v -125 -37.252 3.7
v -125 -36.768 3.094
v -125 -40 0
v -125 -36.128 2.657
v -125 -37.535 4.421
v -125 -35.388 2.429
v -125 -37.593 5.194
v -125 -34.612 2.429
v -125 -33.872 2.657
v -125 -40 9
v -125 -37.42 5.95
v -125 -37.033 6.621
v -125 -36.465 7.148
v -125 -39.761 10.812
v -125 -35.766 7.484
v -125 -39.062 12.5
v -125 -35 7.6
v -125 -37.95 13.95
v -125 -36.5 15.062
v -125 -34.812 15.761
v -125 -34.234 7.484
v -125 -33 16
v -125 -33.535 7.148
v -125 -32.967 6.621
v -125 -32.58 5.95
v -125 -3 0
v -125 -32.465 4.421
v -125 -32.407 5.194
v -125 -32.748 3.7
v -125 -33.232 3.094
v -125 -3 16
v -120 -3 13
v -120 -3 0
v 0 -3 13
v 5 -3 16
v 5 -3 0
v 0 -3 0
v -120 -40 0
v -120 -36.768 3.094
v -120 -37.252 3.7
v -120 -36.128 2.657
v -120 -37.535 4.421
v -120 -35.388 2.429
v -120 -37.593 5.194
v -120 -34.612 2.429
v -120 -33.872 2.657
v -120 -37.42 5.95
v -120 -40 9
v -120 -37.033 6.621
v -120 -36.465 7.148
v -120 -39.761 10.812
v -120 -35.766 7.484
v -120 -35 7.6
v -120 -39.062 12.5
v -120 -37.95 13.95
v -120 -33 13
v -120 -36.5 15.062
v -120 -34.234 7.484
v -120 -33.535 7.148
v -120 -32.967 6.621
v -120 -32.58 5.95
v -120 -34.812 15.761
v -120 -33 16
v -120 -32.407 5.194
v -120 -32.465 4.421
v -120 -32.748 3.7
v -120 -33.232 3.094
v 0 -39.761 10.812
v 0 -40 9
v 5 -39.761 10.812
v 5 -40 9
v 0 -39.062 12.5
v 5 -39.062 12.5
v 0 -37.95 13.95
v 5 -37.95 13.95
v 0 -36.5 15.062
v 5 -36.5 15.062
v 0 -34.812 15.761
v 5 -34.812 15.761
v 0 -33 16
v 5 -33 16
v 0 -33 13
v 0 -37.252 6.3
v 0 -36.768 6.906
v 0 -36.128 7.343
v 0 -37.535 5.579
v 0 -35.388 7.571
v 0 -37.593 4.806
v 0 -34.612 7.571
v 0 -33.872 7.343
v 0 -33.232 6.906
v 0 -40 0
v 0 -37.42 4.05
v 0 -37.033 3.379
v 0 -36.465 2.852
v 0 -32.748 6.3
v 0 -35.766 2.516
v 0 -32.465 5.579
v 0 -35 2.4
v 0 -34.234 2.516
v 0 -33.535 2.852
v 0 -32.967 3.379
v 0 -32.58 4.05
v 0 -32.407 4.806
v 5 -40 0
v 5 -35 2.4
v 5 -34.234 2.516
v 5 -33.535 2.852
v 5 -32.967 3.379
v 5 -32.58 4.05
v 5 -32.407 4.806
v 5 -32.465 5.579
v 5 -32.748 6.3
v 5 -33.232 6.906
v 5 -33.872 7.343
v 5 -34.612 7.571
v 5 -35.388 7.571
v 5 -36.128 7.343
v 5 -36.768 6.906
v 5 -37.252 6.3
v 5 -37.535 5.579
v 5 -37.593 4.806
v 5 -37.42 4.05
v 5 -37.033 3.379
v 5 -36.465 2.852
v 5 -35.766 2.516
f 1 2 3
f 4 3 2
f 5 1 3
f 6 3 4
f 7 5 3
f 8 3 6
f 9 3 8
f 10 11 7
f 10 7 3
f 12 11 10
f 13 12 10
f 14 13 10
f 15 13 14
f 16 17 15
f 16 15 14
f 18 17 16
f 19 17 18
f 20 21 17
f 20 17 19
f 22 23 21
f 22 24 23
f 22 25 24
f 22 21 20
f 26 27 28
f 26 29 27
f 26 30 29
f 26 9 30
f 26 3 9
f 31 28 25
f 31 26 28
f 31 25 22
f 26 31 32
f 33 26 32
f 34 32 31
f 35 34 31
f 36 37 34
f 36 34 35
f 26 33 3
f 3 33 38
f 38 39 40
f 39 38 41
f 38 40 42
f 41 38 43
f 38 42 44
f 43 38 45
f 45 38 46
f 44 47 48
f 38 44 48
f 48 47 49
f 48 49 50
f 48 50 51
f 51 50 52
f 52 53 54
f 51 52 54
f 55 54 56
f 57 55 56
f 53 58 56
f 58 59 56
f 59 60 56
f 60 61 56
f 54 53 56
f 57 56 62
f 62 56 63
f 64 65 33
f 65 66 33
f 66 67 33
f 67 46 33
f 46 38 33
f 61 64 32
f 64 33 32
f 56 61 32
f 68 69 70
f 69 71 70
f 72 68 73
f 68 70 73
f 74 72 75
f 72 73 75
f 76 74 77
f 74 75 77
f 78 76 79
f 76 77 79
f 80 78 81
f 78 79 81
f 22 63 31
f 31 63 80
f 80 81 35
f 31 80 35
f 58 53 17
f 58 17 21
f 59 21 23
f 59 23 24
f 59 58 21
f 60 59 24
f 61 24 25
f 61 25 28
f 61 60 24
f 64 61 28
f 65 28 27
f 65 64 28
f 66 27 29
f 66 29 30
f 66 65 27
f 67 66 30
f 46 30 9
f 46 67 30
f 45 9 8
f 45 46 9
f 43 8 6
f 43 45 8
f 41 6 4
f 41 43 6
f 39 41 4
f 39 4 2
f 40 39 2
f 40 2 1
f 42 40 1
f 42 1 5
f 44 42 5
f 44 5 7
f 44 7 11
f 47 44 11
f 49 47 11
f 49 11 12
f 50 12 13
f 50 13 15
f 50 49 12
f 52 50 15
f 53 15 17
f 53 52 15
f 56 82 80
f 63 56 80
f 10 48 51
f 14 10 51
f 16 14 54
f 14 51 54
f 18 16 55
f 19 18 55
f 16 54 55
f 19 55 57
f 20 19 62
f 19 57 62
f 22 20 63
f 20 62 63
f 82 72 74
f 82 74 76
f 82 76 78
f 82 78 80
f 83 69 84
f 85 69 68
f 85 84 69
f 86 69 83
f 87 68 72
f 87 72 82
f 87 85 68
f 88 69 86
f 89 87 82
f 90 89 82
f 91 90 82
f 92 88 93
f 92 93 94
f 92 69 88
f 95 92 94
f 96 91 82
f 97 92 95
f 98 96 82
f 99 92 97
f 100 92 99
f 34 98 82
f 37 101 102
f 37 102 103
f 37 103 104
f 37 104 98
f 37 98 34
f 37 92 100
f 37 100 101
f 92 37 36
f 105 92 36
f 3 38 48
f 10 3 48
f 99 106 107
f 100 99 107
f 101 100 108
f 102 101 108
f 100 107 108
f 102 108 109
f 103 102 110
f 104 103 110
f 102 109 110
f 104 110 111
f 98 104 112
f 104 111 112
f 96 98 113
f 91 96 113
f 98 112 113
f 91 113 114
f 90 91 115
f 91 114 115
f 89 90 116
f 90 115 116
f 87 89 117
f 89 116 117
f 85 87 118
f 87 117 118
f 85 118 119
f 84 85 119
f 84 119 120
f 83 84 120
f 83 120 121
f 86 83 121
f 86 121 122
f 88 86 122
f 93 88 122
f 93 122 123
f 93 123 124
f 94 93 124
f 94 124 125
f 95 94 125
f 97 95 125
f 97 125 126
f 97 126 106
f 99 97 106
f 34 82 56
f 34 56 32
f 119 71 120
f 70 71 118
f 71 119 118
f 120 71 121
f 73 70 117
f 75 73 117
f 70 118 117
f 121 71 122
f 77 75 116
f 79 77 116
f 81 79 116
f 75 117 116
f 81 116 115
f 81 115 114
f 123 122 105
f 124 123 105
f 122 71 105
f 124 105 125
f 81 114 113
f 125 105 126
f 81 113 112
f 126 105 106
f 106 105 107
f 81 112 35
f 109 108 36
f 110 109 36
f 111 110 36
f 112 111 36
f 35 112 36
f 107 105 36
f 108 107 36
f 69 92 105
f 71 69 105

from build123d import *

# Parameters (mm, degrees)
ESQUISSE1_W             = 5
ESQUISSE1_H             = 40
BOSS_EXTRU_1_DEPTH      = 10
ESQUISSE2_R             = 2.6
ENL_V_MAT_EXTRU_1_DEPTH = 10
ESQUISSE3_W             = 5
ESQUISSE3_H             = 40
BOSS_EXTRU_2_DEPTH      = 6
CONG_1_R                = 7
ESQUISSE6_W             = 3
ESQUISSE6_H             = 33
BOSS_EXTRU_4_DEPTH      = 120
ESQUISSE8_R             = 2.6
BOSS_EXTRU_5_DEPTH      = 5
ESQUISSE9_W             = 130
ESQUISSE9_H             = 3
ENL_V_MAT_EXTRU_2_DEPTH = 20


with BuildPart() as part:
    # Esquisse1 → Boss.-Extru.1 (new body)
    with BuildSketch(Plane.XY):
        with Locations((2.5, -20)):
            Rectangle(ESQUISSE1_W, ESQUISSE1_H)
    extrude(amount=BOSS_EXTRU_1_DEPTH)

    # Esquisse2 → Enlèv. mat.-Extru.1 (cut)
    with BuildSketch(Plane(origin=(5, 0, 0), x_dir=(0, 0, -1), z_dir=(1, 0, 0))):
        with Locations((-5, -35)):
            Circle(ESQUISSE2_R)
    extrude(amount=-ENL_V_MAT_EXTRU_1_DEPTH, mode=Mode.SUBTRACT)

    # Esquisse3 → Boss.-Extru.2 (add)
    with BuildSketch(Plane.XY.offset(10)):
        with Locations((2.5, -20)):
            Rectangle(ESQUISSE3_W, ESQUISSE3_H)
    extrude(amount=BOSS_EXTRU_2_DEPTH)

    # Congé1
    cong_1_edges = [part.edges().sort_by_distance(p)[0] for p in [
        (2.5, -40, 16),
    ]]
    fillet(cong_1_edges, radius=CONG_1_R)

    # Esquisse6 → Boss.-Extru.4 (add)
    with BuildSketch(Plane.ZY):
        with Locations((14.5, -16.5)):
            Rectangle(ESQUISSE6_W, ESQUISSE6_H)
    extrude(amount=BOSS_EXTRU_4_DEPTH)

    # Esquisse8 → Boss.-Extru.5 (add)
    with BuildSketch(Plane.ZY.offset(120)):
        with BuildLine():
            Line((16, 0), (0, 0))
            Line((0, 0), (0, -40))
            Line((0, -40), (9, -40))
            ThreePointArc((9, -40), (13.949747468, -37.949747468), (16, -33))
            Line((16, -33), (16, 0))
        make_face()
        with Locations((5, -35)):
            Circle(ESQUISSE8_R, mode=Mode.SUBTRACT)
    extrude(amount=BOSS_EXTRU_5_DEPTH)

    # Esquisse9 → Enlèv. mat.-Extru.2 (cut)
    with BuildSketch(Plane.XY):
        with Locations((-60, -1.5)):
            Rectangle(ESQUISSE9_W, ESQUISSE9_H)
    extrude(amount=ENL_V_MAT_EXTRU_2_DEPTH, mode=Mode.SUBTRACT)


solid = part.part
